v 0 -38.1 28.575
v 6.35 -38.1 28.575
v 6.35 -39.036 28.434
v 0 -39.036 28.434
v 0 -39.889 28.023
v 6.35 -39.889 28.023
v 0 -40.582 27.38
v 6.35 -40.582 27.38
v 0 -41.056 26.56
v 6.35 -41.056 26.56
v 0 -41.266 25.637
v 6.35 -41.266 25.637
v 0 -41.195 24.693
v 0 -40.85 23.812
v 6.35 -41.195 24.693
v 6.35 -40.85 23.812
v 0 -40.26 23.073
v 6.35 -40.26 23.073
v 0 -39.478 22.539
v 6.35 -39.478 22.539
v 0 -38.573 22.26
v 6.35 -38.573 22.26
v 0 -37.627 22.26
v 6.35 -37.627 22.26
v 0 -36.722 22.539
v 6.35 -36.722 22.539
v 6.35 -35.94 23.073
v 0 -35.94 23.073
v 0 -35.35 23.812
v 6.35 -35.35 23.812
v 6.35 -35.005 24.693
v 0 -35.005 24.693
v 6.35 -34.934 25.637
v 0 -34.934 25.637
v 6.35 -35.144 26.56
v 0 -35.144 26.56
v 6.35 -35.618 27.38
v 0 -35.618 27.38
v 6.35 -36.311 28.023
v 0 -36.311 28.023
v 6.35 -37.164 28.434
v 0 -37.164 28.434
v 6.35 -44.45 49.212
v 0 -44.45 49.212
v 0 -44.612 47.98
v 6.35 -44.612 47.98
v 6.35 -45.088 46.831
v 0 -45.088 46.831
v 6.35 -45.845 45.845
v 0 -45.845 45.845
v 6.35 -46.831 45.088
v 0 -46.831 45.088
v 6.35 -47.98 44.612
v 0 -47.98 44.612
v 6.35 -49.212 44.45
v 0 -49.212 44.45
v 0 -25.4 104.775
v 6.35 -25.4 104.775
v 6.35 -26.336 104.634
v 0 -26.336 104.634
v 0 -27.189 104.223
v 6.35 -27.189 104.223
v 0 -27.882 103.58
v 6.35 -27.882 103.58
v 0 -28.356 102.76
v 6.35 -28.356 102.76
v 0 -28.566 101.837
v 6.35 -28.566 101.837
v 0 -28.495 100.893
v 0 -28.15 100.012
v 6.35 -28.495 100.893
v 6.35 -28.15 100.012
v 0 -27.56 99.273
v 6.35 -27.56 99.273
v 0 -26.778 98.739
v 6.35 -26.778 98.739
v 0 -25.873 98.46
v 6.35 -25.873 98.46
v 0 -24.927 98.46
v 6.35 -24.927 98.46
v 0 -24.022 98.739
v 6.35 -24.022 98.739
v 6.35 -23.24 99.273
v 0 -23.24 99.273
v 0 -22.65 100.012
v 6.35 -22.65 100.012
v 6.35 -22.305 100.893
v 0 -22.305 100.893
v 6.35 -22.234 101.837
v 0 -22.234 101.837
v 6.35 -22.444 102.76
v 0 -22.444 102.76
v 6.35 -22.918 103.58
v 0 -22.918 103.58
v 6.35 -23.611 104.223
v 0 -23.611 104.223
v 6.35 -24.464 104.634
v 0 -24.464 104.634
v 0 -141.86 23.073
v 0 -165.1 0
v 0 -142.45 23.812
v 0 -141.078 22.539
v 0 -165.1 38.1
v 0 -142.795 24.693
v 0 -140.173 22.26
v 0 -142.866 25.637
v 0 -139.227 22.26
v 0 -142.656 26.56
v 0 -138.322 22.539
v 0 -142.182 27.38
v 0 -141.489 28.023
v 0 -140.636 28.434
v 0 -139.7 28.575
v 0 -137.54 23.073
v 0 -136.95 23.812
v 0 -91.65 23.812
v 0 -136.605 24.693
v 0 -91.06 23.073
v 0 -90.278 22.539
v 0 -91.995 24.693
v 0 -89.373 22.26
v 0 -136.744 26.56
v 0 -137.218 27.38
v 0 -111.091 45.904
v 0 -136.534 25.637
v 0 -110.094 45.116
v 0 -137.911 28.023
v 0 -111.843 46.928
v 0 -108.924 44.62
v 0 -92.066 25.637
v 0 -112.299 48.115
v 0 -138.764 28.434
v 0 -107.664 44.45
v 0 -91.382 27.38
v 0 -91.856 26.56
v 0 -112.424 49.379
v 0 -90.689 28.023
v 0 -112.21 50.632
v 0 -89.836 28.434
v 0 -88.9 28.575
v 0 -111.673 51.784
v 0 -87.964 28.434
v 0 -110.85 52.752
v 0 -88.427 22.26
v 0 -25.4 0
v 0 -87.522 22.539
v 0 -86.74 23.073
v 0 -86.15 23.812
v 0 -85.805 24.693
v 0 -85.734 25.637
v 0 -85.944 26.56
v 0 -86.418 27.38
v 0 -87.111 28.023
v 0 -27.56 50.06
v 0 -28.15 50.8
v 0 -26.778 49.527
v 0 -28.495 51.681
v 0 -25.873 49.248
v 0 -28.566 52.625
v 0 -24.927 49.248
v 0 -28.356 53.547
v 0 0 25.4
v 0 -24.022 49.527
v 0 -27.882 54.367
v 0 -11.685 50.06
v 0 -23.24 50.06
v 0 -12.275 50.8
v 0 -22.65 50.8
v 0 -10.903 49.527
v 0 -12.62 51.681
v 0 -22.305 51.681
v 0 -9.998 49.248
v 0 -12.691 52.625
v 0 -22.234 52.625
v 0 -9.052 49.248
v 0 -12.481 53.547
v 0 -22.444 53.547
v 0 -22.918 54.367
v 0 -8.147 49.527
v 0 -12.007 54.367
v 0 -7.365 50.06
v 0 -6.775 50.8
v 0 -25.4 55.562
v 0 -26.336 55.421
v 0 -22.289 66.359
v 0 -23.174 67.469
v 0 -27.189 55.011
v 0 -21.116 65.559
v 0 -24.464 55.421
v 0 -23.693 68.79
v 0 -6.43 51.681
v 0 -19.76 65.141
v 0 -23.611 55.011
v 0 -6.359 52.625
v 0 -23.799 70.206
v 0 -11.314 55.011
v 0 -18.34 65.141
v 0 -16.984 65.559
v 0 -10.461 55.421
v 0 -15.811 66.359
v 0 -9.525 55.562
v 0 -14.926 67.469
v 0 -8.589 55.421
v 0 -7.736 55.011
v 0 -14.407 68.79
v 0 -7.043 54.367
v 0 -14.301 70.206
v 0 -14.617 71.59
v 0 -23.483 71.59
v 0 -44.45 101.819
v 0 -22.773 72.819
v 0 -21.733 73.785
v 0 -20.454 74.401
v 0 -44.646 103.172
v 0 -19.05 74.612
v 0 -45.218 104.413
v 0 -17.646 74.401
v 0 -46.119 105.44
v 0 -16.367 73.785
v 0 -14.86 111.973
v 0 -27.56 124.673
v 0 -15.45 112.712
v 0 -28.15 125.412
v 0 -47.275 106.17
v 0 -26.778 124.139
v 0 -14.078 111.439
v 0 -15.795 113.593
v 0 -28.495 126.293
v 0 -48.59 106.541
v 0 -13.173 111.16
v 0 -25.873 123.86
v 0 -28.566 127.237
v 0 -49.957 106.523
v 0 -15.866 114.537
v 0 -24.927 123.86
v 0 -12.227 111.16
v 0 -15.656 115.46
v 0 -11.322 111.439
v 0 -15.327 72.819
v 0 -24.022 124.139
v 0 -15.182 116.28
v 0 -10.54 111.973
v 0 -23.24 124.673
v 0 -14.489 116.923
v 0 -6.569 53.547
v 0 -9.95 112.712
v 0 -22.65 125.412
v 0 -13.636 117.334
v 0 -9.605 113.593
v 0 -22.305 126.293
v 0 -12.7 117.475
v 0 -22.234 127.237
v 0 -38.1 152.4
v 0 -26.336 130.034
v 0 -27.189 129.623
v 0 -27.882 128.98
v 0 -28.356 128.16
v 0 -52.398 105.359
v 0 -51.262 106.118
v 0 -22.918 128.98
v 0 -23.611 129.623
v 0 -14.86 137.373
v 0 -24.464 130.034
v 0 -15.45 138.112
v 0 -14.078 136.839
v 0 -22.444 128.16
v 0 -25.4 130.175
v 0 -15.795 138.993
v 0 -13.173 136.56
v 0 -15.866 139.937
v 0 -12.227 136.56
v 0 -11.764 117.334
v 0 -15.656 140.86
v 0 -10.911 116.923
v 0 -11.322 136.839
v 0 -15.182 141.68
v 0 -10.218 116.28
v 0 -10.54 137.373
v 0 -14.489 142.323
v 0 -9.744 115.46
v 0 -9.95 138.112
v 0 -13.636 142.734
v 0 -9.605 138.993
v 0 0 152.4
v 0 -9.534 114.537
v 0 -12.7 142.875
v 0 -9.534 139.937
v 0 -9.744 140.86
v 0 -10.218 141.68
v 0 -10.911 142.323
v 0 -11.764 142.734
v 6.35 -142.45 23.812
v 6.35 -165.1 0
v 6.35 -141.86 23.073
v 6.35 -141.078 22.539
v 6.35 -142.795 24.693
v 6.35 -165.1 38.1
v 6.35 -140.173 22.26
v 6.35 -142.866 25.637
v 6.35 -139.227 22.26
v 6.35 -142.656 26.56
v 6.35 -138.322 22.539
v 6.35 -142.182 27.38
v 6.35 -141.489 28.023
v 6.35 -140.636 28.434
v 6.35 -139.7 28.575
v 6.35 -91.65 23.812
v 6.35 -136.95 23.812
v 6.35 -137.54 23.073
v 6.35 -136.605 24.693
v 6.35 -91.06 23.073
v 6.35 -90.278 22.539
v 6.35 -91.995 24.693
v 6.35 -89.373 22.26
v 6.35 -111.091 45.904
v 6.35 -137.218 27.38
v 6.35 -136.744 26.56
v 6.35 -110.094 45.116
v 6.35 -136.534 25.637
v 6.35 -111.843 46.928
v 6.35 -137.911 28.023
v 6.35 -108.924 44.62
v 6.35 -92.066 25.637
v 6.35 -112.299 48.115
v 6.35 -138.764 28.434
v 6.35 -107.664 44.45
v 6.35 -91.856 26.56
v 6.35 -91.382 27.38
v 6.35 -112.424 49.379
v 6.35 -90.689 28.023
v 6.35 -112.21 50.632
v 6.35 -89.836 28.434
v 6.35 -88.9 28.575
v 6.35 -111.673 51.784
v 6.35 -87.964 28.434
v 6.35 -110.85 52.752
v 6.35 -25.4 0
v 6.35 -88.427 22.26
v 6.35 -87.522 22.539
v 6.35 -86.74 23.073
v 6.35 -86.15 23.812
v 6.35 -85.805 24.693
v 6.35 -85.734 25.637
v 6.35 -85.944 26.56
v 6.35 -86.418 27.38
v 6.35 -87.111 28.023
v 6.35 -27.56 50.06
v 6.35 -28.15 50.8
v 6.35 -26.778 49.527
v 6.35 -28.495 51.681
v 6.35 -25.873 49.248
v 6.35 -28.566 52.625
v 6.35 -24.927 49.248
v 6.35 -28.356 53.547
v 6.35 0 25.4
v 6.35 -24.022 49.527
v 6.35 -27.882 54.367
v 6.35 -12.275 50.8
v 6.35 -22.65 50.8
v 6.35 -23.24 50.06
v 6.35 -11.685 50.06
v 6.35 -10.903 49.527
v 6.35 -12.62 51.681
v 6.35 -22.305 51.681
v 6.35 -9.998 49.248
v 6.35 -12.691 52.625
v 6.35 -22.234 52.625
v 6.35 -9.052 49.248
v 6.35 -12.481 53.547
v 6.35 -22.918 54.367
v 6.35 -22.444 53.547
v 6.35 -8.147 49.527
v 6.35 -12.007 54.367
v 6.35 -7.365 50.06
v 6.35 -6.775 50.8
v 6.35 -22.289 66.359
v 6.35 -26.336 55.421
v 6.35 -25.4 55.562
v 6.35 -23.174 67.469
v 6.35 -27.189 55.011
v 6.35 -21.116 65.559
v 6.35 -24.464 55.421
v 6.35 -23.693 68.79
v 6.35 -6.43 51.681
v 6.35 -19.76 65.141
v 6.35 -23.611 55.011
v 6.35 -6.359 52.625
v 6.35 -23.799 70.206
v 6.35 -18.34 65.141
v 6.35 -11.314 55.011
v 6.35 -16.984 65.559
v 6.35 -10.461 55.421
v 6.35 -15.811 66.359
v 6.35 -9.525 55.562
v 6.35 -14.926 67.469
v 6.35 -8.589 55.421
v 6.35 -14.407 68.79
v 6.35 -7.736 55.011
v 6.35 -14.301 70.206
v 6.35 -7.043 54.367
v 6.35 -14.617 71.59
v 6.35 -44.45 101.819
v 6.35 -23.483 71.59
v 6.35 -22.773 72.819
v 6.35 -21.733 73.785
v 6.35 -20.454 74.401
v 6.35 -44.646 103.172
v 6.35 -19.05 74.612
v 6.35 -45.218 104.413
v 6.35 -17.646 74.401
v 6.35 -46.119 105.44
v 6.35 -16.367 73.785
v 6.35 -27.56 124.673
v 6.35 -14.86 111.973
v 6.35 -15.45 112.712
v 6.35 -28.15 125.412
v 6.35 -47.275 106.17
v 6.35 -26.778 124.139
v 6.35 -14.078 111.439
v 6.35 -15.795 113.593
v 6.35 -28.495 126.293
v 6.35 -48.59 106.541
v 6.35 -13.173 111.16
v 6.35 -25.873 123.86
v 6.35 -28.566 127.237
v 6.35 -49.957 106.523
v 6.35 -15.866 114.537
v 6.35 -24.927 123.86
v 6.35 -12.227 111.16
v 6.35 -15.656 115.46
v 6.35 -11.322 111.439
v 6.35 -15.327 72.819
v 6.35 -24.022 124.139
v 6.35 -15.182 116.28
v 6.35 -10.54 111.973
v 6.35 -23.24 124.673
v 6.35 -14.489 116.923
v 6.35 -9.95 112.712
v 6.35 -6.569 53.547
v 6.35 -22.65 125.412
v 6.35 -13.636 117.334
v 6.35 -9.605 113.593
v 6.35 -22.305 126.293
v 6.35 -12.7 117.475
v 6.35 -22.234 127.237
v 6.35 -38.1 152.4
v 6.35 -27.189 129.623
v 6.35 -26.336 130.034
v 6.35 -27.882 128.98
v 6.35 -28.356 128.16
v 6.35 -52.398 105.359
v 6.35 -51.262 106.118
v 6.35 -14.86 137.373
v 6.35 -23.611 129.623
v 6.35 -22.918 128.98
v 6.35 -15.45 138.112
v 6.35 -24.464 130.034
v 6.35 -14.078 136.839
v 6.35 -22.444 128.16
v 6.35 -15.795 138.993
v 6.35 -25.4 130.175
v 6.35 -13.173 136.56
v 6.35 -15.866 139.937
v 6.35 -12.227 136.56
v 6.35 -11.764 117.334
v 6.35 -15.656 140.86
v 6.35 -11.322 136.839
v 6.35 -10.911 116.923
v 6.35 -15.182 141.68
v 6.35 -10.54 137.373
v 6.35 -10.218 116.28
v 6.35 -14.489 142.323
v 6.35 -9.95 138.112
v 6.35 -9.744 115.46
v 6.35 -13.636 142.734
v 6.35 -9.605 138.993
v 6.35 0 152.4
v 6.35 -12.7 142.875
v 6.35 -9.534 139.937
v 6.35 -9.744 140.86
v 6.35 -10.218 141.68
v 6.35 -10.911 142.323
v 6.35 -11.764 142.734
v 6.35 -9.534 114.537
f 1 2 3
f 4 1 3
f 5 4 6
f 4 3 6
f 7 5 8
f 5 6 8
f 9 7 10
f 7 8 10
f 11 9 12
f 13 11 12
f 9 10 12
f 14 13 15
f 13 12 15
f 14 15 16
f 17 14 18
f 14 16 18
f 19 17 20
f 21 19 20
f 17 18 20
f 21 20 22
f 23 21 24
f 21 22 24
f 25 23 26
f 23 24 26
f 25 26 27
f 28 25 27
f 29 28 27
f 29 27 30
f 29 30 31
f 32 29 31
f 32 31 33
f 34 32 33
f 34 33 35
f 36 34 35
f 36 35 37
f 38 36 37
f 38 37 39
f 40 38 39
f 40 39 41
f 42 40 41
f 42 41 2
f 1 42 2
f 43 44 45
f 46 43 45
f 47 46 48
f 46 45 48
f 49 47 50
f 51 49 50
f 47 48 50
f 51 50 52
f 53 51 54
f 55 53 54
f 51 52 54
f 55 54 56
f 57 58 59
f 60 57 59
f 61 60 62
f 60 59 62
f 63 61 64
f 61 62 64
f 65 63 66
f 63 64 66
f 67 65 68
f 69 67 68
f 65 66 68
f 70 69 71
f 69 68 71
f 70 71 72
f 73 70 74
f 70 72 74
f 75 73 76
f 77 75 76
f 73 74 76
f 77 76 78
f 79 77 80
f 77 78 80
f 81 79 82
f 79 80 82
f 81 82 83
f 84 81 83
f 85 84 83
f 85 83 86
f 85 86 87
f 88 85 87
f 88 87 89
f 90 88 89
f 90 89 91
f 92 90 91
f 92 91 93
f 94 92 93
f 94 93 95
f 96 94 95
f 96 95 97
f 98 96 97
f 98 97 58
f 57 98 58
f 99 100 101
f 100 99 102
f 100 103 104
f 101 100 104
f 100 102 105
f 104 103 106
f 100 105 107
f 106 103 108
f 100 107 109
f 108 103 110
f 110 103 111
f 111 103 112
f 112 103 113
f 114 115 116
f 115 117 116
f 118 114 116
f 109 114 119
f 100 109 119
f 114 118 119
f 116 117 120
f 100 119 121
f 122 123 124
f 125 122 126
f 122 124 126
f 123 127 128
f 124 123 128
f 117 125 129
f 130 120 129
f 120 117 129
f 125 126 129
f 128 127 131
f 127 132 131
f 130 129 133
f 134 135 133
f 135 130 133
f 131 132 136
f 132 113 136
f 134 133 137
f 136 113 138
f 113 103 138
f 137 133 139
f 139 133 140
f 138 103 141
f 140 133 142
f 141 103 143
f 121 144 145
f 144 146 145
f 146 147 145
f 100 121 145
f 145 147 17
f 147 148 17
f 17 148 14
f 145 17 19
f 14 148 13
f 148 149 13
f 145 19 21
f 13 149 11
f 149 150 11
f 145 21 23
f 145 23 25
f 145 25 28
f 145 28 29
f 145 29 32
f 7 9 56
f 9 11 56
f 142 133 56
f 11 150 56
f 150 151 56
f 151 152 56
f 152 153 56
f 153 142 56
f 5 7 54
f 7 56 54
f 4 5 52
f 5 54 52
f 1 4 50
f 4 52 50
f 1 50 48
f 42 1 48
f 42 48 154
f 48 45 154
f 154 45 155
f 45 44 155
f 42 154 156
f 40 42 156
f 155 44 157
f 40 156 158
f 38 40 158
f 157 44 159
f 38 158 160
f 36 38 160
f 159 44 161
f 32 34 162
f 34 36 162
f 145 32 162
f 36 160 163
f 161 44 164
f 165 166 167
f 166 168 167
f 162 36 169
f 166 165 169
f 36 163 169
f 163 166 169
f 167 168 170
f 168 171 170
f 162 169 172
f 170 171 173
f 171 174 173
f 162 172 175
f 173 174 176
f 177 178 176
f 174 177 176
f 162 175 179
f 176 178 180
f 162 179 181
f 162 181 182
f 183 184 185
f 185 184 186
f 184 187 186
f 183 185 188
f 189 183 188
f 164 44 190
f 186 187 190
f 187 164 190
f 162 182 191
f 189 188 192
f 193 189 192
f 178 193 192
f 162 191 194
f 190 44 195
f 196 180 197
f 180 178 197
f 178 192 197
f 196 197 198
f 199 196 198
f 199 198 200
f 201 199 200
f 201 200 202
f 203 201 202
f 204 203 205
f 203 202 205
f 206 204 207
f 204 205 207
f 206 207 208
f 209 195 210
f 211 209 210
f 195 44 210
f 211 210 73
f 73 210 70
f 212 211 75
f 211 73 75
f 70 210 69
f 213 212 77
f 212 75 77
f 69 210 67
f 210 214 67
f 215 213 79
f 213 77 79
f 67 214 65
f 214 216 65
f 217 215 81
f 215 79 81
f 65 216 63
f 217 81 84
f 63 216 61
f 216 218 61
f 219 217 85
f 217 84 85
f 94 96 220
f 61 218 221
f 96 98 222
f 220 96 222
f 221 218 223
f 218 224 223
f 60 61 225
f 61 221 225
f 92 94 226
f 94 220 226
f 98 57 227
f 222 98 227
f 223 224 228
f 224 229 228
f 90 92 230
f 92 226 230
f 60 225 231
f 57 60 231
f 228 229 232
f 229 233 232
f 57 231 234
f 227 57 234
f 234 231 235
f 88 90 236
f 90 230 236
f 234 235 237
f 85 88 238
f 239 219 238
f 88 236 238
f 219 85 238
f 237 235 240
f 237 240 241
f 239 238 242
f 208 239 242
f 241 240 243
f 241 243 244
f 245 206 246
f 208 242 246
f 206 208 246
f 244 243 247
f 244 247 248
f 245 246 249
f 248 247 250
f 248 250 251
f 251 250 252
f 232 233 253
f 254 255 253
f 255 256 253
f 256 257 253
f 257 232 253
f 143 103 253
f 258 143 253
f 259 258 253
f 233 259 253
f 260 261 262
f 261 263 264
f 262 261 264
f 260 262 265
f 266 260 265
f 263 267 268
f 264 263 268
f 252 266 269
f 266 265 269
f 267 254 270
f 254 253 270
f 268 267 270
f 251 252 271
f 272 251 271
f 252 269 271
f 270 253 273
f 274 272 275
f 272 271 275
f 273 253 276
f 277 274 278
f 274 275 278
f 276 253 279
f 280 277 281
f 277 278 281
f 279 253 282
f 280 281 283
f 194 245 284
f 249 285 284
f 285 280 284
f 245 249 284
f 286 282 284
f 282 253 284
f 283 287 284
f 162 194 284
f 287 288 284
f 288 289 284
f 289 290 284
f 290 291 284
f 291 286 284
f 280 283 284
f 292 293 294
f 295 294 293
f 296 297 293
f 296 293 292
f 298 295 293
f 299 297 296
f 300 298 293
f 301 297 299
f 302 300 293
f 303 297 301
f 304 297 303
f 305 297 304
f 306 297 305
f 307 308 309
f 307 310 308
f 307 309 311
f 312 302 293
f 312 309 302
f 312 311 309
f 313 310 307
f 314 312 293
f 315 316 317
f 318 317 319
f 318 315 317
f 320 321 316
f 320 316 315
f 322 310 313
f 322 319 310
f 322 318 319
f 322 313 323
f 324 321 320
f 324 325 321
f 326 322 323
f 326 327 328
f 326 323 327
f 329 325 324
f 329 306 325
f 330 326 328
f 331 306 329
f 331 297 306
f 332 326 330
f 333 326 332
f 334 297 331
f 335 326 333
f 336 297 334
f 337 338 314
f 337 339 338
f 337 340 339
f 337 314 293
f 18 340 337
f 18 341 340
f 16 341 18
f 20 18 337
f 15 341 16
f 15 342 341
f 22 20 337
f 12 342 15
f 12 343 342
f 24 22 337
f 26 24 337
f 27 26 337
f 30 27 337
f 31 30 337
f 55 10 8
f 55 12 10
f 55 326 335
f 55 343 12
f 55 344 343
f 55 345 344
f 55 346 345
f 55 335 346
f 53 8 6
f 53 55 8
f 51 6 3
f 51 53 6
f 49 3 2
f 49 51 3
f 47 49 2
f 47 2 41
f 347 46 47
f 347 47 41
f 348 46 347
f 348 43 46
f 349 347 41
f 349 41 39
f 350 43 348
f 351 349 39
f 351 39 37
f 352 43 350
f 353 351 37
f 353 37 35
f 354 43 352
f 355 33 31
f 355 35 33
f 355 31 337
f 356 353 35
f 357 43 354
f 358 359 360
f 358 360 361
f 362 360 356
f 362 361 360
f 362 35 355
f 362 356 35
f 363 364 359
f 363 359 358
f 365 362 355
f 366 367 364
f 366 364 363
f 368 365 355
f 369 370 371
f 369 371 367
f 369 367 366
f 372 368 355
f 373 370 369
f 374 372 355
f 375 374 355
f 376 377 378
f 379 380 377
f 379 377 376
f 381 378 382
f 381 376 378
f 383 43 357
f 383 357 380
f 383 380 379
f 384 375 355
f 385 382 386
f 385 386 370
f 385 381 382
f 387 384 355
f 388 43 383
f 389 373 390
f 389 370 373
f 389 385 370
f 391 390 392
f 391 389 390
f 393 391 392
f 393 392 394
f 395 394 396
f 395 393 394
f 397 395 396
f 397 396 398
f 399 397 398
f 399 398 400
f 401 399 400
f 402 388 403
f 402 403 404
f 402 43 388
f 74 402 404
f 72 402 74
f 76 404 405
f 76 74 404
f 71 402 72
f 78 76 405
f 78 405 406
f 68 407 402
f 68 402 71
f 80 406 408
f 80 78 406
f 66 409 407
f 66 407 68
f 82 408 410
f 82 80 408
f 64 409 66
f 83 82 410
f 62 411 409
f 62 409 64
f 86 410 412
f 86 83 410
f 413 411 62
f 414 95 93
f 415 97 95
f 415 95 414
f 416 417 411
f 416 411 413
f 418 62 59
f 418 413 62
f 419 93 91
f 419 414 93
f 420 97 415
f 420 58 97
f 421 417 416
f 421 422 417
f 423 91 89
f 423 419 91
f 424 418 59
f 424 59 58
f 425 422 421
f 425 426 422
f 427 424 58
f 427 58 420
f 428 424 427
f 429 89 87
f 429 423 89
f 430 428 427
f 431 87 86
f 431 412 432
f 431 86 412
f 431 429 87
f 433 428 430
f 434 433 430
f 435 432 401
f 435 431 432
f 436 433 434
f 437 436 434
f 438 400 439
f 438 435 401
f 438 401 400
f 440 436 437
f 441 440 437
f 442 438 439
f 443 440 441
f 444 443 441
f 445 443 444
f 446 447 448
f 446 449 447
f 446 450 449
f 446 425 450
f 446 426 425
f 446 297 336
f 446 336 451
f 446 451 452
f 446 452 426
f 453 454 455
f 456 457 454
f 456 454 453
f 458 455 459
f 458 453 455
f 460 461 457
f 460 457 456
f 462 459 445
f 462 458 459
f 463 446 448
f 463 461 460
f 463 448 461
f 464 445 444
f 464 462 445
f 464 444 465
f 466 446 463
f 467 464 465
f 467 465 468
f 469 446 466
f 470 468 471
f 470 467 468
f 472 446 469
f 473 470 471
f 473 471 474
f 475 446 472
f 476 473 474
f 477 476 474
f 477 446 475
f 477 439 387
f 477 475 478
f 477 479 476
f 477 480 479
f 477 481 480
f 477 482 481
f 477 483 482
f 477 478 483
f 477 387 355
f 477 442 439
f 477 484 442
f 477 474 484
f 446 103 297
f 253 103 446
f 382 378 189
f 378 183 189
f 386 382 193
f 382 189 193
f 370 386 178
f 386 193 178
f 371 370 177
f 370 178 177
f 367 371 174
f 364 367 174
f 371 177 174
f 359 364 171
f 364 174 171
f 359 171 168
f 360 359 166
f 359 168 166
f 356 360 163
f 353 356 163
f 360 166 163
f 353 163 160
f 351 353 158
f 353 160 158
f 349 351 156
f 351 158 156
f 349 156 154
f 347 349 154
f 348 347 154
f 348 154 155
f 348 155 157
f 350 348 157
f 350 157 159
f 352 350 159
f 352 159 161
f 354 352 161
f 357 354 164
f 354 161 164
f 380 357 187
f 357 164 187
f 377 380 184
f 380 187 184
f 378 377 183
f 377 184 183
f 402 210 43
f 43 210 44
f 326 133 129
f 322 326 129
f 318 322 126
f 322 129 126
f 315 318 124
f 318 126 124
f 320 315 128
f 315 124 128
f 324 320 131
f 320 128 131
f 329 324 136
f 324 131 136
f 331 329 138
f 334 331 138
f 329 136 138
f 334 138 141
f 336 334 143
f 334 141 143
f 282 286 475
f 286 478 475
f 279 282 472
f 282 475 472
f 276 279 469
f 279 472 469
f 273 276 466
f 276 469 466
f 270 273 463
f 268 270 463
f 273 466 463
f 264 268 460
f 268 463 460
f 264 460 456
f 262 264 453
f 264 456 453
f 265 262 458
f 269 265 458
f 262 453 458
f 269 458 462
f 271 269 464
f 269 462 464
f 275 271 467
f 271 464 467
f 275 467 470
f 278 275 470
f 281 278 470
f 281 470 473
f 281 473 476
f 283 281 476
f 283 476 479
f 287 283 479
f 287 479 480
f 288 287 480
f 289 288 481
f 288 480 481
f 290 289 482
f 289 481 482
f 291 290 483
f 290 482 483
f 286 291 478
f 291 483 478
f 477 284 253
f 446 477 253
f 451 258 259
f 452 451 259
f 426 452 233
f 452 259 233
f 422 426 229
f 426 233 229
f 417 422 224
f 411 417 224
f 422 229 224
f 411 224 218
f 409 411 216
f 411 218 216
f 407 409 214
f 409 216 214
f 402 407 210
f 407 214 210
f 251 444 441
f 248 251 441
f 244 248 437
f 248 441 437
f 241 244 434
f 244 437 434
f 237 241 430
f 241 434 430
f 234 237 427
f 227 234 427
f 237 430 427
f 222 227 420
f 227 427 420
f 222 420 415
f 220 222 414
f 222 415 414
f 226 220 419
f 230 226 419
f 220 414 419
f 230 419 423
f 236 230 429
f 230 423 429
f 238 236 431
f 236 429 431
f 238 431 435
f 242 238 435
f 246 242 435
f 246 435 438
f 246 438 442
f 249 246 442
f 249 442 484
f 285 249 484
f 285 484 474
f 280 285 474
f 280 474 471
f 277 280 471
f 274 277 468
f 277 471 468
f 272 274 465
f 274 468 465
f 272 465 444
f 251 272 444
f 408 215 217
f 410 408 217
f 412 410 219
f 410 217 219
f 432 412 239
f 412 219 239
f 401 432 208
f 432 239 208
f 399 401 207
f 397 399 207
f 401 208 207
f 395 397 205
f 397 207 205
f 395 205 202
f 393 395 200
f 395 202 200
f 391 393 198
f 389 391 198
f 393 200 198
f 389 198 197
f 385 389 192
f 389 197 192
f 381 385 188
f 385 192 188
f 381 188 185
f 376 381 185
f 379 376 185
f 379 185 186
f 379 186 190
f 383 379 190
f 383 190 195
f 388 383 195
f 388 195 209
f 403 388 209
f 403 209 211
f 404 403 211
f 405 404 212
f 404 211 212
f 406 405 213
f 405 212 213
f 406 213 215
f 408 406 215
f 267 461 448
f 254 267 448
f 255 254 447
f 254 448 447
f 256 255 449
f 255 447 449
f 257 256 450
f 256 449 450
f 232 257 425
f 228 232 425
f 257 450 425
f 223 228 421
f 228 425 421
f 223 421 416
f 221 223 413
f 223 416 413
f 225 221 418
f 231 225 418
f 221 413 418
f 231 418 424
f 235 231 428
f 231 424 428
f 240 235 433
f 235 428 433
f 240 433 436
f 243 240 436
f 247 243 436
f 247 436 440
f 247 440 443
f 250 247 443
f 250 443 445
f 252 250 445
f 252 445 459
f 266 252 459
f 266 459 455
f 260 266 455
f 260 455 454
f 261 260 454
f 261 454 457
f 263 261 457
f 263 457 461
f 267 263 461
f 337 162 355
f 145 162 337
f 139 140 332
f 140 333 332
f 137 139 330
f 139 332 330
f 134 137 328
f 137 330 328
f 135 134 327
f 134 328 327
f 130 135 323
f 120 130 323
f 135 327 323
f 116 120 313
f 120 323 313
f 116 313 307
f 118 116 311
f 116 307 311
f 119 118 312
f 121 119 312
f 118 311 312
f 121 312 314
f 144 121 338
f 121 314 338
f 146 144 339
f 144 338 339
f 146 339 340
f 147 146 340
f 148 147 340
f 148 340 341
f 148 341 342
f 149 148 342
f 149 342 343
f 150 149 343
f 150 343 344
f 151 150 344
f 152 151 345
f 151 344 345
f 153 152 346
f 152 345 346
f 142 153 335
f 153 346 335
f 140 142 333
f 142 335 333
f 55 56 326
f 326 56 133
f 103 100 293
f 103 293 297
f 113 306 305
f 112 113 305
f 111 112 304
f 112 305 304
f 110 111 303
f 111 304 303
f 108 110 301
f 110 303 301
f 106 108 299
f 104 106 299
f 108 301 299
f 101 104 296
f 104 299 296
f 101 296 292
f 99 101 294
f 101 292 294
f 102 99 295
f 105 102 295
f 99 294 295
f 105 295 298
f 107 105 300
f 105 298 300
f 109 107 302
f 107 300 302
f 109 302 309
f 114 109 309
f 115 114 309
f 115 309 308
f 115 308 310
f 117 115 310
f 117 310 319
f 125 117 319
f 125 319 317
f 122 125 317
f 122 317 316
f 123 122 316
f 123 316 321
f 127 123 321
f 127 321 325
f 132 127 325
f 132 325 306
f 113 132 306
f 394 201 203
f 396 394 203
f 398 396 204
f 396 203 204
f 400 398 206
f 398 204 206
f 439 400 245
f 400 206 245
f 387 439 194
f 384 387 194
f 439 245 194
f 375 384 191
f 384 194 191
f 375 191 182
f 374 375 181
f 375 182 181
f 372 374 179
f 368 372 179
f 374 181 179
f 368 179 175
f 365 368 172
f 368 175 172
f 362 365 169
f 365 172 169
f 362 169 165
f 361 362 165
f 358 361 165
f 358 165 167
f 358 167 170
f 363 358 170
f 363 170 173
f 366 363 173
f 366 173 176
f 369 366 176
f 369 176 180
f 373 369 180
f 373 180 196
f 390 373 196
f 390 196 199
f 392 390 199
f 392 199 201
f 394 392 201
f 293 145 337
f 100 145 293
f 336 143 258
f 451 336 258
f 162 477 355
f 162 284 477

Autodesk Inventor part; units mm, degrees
ref_plane "YZ Plane" through (0, 0, 0) normal (1, 0, 0) x (0, 1, 0)
ref_plane "XZ Plane" through (0, 0, 0) normal (0, 1, 0) x (-1, 0, 0)
ref_plane "XY Plane" through (0, 0, 0) normal (0, 0, 1) x (1, 0, 0)
sketch "Sketch1" plane through (0, 0, 0) normal (1, 0, 0) x (0, 1, 0)
  line L0 (0, 0) -> (-165.1, 0) construction
  line L1 (-165.1, 0) -> (-165.1, 152.4) construction
  line L2 (-165.1, 152.4) -> (0, 152.4) construction
  line L3 (0, 152.4) -> (0, 0) construction
  line L4 (0, 152.4) -> (-38.1, 152.4)
  line L5 (-165.1, 0) -> (-165.1, 38.1)
  line L6 (-165.1, 38.1) -> (-38.1, 152.4)
  line L7 (0, 152.4) -> (0, 0)
  line L8 (0, 0) -> (-165.1, 0)
  dimension "d0" = 165.1
  dimension "d1" = 152.4
  dimension "d2" = 38.1
  dimension "d3" = 38.1
extrude "Extrusion1" add sketch "Sketch1" along normal blind 6.35
sketch "Sketch2" plane through (0, 0, 0) normal (-1, 0, 0) x (0, 0, 1)
  line L0 (0, -165.1) -> (0, 0) projected
  line L1 (38.1, -165.1) -> (0, -165.1) projected
  point P0 (25.4, -139.7)
  point P1 (25.4, -88.9)
  point P2 (25.4, -38.1)
  dimension "d6" = 25.4
  dimension "d7" = 25.4
  dimension "d8" = 25.4
  dimension "d9" = 25.4
  dimension "d10" = 50.8
  dimension "d11" = 50.8
hole "Hole1" at (0, -139.7, 25.4) at (0, -88.9, 25.4) at (0, -38.1, 25.4) direction (1, 0, 0) diameter 6.35 end through all
sketch "Sketch3" plane through (0, 0, 0) normal (-1, 0, 0) x (0, 0, 1)
  line L0 (0, -165.1) -> (0, 0) projected
  line L1 (0, 0) -> (25.4, 0)
  line L2 (0, 0) -> (152.4, 0) projected
  line L3 (25.4, 0) -> (0, -25.4)
  line L4 (0, -165.1) -> (0, 0) projected
  line L5 (0, -25.4) -> (0, 0)
  dimension "d19" = 25.4
  dimension "d20" = 45
extrude "Extrusion2" cut sketch "Sketch3" against normal blind 6.35
sketch "Sketch4" plane through (0, 0, 0) normal (-1, 0, 0) x (0, 0, 1)
  line L0 (152.4, 0) -> (152.4, -38.1) projected
  line L1 (25.4, 0) -> (152.4, 0) projected
  point P0 (0, 0)
  point P1 (139.7, -12.7)
  point P2 (127, -25.4)
  point P3 (114.3, -12.7)
  point P4 (101.6, -25.4)
  dimension "d23" = 12.7
  dimension "d24" = 12.7
  dimension "d25" = 25.4
  dimension "d26" = 25.4
  dimension "d27" = 12.7
  dimension "d28" = 38.1
  dimension "d29" = 50.8
  dimension "d30" = 25.4
hole "Hole2" at (0, -12.7, 139.7) at (0, -25.4, 127) at (0, -12.7, 114.3) at (0, -25.4, 101.6) direction (1, 0, 0) diameter 6.35 end through all
sketch "Sketch5" plane through (0, 0, 0) normal (-1, 0, 0) x (0, 0, 1)
  line L0 (0, -165.1) -> (0, -25.4) projected
  line L1 (25.4, 0) -> (152.4, 0) projected
  circle A0 centre (69.85, -19.05) radius 4.7625
  circle A1 centre (52.3875, -25.4) radius 3.175
  circle A2 centre (52.3875, -9.525) radius 3.175
  point P0 (0, 0)
  dimension "d38" = 52.3875
  dimension "d39" = 52.3875
  dimension "d40" = 69.85
  dimension "d41" = 19.05
  dimension "d42" = 9.525
  dimension "d43" = 25.4
  dimension "d44" = 9.525
  dimension "d45" = 6.35
  dimension "d46" = 6.35
extrude "Extrusion3" cut sketch "Sketch5" against normal blind 6.35
sketch "Sketch6" plane through (0, 0, 0) normal (-1, 0, 0) x (0, 0, 1)
  circle A0 centre (52.3875, -9.525) radius 3.175 projected
  circle A1 centre (52.3875, -25.4) radius 3.175 projected
  circle A2 centre (69.85, -19.05) radius 4.7625 projected
  circle A3 centre (114.3, -12.7) radius 3.175 projected
  circle A4 centre (139.7, -12.7) radius 3.175 projected
  circle A5 centre (127, -25.4) radius 3.175 projected
  circle A6 centre (101.6, -25.4) radius 3.175 projected
  line L0 (25.4, 0) -> (0, -25.4) projected
  line L1 (0, -165.1) -> (0, -25.4) projected
  line L2 (38.1, -165.1) -> (0, -165.1) projected
  line L3 (152.4, -38.1) -> (38.1, -165.1) projected
  line L4 (152.4, 0) -> (152.4, -38.1) projected
  line L5 (25.4, 0) -> (152.4, 0) projected
  circle A7 centre (25.4, -38.1) radius 3.175 projected
  circle A8 centre (25.4, -139.7) radius 3.175 projected
  circle A9 centre (25.4, -88.9) radius 3.175 projected
  line L6 (101.8193, -44.45) -> (49.2125, -44.45)
  line L7 (44.45, -49.2125) -> (44.45, -107.6645)
  line L8 (52.7524, -110.8504) -> (105.3592, -52.3984)
  line L9 (152.4, -38.1) -> (38.1, -38.1) construction
  line L10 (38.1, -38.1) -> (38.1, -165.1) construction
  line L11 (38.1, -165.1) -> (152.4, -165.1) construction
  line L12 (152.4, -165.1) -> (152.4, -38.1) construction
  arc A10 (105.3592, -52.3984) -> (101.8193, -44.45) centre (101.8193, -49.2125) ccw
  arc A11 (49.2125, -44.45) -> (44.45, -49.2125) centre (49.2125, -49.2125) ccw
  arc A12 (44.45, -107.6645) -> (52.7524, -110.8504) centre (49.2125, -107.6645) ccw
  point P0 (0, 0)
  dimension "d49" = 6.35
  dimension "d50" = 6.35
  dimension "d52" = 25.4
  dimension "d53" = 4.7625
extrude "Extrusion4" cut sketch "Sketch6" against normal blind 25.4 contours A10 L8 A12 L7 A11 L6
properties part number "mounting bracket" material "Aluminum 6061"
